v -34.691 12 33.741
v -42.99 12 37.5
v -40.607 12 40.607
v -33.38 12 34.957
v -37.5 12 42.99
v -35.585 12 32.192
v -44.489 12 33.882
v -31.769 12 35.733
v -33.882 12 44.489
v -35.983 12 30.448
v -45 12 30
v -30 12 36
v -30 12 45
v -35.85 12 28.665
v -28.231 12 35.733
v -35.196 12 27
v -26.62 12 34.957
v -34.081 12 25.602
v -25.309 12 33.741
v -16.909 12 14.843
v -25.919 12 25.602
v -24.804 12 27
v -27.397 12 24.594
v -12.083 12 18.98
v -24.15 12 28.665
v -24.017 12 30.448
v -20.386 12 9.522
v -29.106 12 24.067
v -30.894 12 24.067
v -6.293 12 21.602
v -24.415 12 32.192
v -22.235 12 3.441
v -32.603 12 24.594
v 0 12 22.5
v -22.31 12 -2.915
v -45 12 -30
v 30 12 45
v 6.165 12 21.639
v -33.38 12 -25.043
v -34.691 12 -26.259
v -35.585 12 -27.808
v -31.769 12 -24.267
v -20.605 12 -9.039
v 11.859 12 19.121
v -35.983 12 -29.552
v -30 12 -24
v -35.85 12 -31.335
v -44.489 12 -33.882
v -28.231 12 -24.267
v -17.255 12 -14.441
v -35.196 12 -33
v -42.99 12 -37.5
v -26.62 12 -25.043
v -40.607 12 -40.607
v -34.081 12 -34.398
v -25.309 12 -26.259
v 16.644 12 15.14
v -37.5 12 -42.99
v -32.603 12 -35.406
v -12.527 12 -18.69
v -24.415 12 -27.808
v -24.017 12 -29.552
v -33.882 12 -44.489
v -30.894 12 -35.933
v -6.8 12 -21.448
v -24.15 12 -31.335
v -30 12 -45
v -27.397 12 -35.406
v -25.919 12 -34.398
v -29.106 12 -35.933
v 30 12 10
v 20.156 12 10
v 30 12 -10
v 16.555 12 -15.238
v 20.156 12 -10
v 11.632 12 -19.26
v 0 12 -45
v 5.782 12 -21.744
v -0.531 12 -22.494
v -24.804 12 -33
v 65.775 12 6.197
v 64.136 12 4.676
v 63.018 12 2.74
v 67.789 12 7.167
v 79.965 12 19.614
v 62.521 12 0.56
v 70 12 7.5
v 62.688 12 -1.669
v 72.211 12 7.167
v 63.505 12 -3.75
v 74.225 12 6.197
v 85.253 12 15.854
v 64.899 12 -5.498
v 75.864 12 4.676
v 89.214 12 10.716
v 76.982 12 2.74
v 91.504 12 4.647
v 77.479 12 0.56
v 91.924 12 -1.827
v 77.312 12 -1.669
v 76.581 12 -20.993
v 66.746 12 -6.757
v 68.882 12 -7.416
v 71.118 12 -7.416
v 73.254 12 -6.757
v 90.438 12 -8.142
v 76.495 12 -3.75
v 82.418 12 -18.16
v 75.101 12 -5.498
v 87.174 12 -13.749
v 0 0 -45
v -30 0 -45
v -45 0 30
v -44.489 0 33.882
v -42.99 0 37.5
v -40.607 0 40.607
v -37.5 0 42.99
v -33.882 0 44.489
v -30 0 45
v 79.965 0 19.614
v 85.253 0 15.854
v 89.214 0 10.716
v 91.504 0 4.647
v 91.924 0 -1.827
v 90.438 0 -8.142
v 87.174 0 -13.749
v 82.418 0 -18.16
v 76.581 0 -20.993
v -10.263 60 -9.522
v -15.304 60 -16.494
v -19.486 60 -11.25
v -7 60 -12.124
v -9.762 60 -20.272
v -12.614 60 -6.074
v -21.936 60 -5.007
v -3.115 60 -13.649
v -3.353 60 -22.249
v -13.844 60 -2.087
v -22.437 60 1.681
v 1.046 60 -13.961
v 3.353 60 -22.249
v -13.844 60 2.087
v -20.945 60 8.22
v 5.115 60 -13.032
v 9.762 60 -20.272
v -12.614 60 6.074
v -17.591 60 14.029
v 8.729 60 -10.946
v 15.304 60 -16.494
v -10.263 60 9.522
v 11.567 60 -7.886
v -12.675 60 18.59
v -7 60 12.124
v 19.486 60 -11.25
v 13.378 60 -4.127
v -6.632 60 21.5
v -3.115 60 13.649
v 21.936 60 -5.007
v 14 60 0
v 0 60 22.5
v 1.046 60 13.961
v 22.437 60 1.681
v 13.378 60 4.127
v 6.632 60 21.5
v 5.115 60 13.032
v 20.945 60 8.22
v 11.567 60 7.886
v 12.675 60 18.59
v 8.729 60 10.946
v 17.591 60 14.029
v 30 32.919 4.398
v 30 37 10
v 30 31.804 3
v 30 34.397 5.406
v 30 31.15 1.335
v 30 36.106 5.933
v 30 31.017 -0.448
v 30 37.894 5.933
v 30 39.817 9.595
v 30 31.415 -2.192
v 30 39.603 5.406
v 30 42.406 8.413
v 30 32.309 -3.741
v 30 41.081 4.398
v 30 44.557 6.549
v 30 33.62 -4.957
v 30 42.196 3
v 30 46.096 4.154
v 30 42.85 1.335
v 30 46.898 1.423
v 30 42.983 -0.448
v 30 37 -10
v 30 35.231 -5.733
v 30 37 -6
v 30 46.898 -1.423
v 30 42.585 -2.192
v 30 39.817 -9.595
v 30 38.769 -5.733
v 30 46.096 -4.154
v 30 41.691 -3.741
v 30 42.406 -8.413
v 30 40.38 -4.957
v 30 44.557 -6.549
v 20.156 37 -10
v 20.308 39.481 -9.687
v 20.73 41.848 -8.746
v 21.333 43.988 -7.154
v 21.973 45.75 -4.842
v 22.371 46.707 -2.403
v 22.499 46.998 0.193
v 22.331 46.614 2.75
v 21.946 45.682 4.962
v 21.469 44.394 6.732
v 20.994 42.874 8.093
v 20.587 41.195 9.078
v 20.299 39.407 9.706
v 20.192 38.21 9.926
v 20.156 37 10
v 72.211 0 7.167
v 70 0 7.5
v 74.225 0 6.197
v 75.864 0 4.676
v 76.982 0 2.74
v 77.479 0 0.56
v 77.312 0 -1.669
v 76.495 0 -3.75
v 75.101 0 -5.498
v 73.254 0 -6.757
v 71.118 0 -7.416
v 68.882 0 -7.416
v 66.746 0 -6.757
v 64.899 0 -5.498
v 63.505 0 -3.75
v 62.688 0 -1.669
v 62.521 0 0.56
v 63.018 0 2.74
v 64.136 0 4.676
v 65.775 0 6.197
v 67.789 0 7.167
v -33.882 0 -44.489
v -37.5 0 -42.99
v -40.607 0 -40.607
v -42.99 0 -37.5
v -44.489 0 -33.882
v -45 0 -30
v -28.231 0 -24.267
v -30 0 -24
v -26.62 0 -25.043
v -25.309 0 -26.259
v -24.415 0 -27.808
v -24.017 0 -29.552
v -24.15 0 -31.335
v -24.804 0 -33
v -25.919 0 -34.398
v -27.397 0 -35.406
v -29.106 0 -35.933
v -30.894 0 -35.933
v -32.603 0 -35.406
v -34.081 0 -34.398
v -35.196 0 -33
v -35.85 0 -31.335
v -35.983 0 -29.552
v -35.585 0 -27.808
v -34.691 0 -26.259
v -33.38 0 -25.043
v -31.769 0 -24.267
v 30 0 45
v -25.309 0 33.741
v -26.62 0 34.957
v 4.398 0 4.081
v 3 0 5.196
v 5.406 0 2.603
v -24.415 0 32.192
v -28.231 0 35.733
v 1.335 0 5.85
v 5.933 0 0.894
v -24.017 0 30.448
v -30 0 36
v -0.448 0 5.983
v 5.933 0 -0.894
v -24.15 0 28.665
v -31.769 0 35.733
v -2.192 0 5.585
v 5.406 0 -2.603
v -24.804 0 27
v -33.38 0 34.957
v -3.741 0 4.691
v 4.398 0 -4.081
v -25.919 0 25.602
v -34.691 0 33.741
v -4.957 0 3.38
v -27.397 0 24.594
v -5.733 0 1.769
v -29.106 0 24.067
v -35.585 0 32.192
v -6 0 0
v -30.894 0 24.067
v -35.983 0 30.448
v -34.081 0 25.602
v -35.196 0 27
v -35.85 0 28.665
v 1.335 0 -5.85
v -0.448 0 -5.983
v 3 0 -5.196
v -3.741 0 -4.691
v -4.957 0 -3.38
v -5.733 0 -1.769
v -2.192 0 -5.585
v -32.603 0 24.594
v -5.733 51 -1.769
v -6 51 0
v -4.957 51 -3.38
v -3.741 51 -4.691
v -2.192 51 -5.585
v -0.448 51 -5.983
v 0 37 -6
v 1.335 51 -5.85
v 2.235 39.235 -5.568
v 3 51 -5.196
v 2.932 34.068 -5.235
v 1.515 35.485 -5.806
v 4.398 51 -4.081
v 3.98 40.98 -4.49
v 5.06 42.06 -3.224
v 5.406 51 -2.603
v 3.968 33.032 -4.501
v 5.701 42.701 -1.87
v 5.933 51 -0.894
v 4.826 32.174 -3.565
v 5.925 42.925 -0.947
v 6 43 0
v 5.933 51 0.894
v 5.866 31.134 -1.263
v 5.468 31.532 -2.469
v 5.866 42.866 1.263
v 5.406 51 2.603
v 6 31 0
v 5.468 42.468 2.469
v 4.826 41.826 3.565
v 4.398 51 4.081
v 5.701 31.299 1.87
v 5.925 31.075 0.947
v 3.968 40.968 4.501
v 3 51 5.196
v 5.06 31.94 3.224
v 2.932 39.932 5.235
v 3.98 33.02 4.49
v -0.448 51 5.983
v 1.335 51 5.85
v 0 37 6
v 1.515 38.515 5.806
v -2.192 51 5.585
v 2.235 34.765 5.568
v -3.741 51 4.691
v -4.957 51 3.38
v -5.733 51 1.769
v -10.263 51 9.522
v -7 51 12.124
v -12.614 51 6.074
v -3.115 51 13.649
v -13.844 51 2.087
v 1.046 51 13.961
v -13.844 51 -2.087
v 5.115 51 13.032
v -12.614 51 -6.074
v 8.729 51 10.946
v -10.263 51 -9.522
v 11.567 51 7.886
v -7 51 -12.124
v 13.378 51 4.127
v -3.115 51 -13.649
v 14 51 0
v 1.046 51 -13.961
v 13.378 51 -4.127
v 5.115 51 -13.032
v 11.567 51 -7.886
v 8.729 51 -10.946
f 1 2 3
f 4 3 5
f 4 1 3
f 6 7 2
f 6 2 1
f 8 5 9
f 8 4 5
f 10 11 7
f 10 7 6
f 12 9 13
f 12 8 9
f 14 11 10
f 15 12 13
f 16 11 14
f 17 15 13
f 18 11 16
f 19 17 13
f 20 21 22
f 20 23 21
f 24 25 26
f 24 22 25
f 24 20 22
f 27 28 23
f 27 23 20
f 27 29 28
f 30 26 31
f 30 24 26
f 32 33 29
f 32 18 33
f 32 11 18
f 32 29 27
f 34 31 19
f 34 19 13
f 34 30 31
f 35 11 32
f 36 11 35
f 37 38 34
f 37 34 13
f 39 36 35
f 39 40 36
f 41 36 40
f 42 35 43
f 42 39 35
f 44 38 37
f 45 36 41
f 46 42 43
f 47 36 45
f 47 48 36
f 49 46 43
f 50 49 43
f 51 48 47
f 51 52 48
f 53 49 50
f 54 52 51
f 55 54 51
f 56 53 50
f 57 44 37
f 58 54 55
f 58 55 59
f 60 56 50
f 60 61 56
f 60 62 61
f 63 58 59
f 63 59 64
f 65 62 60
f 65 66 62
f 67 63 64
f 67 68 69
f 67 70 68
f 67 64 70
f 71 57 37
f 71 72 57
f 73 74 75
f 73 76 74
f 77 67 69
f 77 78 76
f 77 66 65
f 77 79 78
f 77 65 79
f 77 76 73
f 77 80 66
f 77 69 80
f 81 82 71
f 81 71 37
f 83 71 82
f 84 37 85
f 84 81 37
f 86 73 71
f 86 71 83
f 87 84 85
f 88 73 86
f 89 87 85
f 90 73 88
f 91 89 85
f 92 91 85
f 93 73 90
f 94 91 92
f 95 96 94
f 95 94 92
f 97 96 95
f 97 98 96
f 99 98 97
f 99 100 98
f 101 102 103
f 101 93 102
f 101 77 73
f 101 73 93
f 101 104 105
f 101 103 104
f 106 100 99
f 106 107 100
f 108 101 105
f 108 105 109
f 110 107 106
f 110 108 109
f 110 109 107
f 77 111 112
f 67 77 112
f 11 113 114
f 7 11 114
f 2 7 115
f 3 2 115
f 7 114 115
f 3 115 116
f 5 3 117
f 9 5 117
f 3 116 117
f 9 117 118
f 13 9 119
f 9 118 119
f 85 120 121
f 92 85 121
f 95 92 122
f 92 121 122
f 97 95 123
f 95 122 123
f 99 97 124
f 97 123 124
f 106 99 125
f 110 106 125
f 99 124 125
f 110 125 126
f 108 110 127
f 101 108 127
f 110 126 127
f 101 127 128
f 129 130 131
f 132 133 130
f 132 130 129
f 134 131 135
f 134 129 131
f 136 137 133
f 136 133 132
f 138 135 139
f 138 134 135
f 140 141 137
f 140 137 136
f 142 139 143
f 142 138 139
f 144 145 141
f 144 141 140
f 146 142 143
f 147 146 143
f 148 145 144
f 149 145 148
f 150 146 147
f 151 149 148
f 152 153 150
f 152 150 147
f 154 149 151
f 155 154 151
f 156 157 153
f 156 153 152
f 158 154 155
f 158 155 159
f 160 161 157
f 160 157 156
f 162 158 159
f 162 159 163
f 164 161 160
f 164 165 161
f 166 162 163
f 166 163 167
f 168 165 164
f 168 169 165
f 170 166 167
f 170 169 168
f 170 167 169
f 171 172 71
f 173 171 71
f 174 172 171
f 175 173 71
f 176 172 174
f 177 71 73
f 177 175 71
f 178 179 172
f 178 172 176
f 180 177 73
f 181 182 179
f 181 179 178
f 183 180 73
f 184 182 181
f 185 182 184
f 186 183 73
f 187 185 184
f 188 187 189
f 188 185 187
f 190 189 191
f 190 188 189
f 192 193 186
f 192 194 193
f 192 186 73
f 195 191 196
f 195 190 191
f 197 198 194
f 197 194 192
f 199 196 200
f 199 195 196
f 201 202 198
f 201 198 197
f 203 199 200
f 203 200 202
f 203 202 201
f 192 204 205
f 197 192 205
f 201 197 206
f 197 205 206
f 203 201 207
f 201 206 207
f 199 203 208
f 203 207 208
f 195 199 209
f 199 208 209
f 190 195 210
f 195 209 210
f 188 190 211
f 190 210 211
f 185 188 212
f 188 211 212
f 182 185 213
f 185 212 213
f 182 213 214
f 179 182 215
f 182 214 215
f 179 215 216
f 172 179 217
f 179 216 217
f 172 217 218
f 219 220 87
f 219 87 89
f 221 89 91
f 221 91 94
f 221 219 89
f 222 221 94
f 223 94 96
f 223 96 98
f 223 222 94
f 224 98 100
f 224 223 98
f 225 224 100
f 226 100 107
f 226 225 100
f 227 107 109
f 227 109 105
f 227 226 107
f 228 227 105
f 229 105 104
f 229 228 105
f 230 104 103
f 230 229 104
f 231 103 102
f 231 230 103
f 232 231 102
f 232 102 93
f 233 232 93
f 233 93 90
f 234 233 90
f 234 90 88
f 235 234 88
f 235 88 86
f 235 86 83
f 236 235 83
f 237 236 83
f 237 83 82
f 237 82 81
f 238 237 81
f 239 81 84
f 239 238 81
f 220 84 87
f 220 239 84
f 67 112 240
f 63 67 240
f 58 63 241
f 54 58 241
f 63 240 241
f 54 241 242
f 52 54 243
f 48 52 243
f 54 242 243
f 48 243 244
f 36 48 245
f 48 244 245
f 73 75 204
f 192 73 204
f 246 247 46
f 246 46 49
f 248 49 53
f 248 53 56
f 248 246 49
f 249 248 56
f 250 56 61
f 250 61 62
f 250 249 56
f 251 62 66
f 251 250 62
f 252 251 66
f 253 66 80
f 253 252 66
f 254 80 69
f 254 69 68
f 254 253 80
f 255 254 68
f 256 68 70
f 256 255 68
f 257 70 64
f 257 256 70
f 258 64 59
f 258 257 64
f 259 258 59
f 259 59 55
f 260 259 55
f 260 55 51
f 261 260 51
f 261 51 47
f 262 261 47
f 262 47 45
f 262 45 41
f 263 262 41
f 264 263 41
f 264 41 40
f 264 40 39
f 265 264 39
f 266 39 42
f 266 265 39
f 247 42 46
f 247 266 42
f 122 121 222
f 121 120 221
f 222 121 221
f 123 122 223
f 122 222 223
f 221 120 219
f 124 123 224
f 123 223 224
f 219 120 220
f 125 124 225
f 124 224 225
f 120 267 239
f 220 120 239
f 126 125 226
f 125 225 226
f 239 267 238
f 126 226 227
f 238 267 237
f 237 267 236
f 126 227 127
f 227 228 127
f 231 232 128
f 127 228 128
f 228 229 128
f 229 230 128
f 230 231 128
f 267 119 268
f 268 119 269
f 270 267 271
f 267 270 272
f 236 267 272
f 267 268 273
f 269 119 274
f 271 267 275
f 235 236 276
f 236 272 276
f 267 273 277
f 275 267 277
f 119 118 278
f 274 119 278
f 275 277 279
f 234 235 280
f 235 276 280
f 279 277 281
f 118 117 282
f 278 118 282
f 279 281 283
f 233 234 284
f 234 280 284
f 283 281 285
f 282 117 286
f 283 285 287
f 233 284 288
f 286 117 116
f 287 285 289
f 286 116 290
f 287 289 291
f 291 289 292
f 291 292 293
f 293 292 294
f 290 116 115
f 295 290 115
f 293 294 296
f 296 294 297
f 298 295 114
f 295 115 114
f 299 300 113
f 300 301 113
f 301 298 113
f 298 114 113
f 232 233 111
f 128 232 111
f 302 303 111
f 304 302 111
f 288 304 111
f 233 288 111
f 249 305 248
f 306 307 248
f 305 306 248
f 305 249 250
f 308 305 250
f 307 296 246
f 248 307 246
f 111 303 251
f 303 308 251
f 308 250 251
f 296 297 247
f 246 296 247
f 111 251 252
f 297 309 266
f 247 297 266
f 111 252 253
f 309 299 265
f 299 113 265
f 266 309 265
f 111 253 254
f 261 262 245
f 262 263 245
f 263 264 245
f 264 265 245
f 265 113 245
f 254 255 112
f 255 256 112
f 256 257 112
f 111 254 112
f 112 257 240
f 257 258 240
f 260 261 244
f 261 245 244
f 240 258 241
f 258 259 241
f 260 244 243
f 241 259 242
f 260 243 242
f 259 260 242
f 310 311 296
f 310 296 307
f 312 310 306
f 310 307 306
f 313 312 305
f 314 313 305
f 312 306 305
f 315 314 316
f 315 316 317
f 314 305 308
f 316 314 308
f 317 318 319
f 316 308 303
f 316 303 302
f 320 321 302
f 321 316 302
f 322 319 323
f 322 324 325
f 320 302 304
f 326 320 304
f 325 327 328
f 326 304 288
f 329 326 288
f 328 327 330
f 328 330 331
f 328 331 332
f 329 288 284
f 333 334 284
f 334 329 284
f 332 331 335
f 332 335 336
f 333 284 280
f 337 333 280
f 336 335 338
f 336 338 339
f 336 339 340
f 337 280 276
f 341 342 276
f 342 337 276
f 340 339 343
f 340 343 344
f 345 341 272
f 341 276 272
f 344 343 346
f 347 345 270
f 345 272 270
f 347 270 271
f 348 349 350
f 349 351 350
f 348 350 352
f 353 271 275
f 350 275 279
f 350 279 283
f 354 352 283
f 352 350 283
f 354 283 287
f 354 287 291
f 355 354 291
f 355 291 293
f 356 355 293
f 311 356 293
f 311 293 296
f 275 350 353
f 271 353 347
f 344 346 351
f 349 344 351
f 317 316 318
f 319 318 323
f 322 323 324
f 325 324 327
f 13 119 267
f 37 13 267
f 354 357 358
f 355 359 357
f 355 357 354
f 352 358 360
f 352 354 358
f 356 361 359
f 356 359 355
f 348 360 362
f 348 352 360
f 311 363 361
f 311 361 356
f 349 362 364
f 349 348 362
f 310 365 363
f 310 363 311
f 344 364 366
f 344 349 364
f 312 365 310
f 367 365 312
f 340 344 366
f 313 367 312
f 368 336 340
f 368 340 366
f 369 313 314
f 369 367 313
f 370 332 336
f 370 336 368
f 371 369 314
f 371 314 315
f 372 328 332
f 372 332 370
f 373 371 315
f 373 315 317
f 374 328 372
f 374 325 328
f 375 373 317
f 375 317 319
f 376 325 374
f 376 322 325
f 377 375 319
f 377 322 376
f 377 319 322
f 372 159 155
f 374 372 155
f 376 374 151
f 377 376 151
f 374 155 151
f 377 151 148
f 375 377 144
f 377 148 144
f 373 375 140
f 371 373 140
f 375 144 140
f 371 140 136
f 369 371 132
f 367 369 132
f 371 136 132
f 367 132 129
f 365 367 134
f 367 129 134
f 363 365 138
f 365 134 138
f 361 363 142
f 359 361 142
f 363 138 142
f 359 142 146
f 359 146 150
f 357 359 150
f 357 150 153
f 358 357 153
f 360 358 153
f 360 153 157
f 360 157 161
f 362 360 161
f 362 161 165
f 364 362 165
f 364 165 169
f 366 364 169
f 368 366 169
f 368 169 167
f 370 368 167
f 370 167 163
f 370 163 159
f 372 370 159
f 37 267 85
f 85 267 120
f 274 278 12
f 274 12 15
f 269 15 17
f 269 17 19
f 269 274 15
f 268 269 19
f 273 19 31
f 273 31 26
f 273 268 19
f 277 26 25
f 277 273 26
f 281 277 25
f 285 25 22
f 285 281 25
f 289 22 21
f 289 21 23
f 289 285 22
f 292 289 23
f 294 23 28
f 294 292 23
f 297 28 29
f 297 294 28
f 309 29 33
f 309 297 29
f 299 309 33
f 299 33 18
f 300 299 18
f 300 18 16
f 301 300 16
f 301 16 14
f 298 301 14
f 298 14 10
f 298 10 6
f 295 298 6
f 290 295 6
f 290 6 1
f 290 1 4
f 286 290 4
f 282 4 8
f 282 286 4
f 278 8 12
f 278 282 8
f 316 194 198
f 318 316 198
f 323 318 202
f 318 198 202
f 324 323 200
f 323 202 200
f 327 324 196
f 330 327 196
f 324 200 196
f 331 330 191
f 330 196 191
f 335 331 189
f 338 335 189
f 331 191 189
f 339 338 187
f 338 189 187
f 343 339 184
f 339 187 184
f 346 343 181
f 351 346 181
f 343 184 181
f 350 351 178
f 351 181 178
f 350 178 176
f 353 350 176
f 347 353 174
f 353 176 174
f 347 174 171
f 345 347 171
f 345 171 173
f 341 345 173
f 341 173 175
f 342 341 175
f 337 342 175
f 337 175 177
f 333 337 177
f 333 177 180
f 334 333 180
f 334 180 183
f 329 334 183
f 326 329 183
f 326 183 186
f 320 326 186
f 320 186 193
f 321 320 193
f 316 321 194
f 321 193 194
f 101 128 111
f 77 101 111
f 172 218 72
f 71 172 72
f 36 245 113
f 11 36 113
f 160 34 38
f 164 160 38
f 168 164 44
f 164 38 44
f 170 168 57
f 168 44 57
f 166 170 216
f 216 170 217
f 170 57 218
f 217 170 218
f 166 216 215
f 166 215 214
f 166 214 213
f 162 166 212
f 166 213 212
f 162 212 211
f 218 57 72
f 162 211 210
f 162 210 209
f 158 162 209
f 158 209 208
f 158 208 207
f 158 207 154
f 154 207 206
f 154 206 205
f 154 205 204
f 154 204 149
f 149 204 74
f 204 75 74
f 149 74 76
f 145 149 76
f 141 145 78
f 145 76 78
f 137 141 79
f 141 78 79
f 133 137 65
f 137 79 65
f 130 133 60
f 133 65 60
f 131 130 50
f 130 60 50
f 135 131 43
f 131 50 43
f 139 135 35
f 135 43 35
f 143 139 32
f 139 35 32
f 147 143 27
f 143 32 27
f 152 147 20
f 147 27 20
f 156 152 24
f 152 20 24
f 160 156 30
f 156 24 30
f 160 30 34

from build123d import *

# Parameters (mm, degrees)
SKETCH1_R           = 6
SKETCH1_R_2         = 7.5
BOSS_EXTRUDE1_DEPTH = 12
SKETCH2_R           = 22.5
BOSS_EXTRUDE2_DEPTH = 48
HOLE1_D             = 12
HOLE1_DEPTH         = 100
HOLE1_CBORE_D       = 28
HOLE1_CBORE_DEPTH   = 9
BOSS_EXTRUDE5_START = 15
BOSS_EXTRUDE5_DEPTH = 15
HOLE2_REACH         = 108.066
HOLE2_BORE_R        = 6


with BuildPart() as part:
    # Sketch1 → Boss-Extrude1 (new body)
    with BuildSketch(Plane(origin=(0, 0, 0), x_dir=(1, 0, 0), z_dir=(0, 1, 0))):
        with BuildLine():
            Line((-45, 30), (-45, -30))
            ThreePointArc((-45, -30), (-40.606601718, -40.606601718), (-30, -45))
            Line((-30, -45), (30, -45))
            Line((30, -45), (79.965290711, -19.613591743))
            ThreePointArc((79.965290711, -19.613591743), (91.923986167, 1.827246717), (76.580979422, 20.992634657))
            Line((76.580979422, 20.992634657), (0, 45))
            Line((0, 45), (-30, 45))
            ThreePointArc((-30, 45), (-40.606601718, 40.606601718), (-45, 30))
        make_face()
        with Locations(Location((-30, 30, 0), (0, 0, 270))):
            Circle(SKETCH1_R, mode=Mode.SUBTRACT)
        with Locations(Location((-30, -30, 0), (0, 0, 270))):
            Circle(SKETCH1_R, mode=Mode.SUBTRACT)
        with Locations(Location((70, 0, 0), (0, 0, 270))):
            Circle(SKETCH1_R_2, mode=Mode.SUBTRACT)
    extrude(amount=BOSS_EXTRUDE1_DEPTH)

    # Sketch2 → Boss-Extrude2 (add)
    with BuildSketch(Plane(origin=(0, 12, 0), x_dir=(1, 0, 0), z_dir=(0, 1, 0))):
        with Locations(Location((0, 0, 0), (0, 0, 270))):
            Circle(SKETCH2_R)
    extrude(amount=BOSS_EXTRUDE2_DEPTH)

    # Hole1
    with Locations(Plane(origin=(0, 60, 0), x_dir=(1, 0, 0), z_dir=(0, 1, 0))):
        with Locations((0, 0)):
            CounterBoreHole(HOLE1_D / 2, HOLE1_CBORE_D / 2, HOLE1_CBORE_DEPTH, depth=HOLE1_DEPTH)

    # Sketch5 → Boss-Extrude5 (add)
    with BuildSketch(Plane(origin=(0, 0, 0), x_dir=(0, 0, -1), z_dir=(1, 0, 0)).offset(BOSS_EXTRUDE5_START)):
        with BuildLine():
            Line((-10, 37), (-10, 0))
            Line((-10, 0), (10, 0))
            Line((10, 0), (10, 37))
            ThreePointArc((10, 37), (0, 47), (-10, 37))
        make_face()
    extrude(amount=BOSS_EXTRUDE5_DEPTH)

    # Hole2 bore → Hole2 (cut, up to next)
    with BuildSketch(Plane(origin=(30, 0, 0), x_dir=(0, 0, -1), z_dir=(1, 0, 0)), mode=Mode.PRIVATE) as hole2_sk1:
        with Locations((0, 37)):
            Circle(HOLE2_BORE_R)
    hole2_tool1 = extrude(hole2_sk1.sketch, amount=-HOLE2_REACH, mode=Mode.PRIVATE) & part.part
    add(hole2_tool1.solids().sort_by_distance((30, 37, 0))[0], mode=Mode.SUBTRACT)


solid = part.part
